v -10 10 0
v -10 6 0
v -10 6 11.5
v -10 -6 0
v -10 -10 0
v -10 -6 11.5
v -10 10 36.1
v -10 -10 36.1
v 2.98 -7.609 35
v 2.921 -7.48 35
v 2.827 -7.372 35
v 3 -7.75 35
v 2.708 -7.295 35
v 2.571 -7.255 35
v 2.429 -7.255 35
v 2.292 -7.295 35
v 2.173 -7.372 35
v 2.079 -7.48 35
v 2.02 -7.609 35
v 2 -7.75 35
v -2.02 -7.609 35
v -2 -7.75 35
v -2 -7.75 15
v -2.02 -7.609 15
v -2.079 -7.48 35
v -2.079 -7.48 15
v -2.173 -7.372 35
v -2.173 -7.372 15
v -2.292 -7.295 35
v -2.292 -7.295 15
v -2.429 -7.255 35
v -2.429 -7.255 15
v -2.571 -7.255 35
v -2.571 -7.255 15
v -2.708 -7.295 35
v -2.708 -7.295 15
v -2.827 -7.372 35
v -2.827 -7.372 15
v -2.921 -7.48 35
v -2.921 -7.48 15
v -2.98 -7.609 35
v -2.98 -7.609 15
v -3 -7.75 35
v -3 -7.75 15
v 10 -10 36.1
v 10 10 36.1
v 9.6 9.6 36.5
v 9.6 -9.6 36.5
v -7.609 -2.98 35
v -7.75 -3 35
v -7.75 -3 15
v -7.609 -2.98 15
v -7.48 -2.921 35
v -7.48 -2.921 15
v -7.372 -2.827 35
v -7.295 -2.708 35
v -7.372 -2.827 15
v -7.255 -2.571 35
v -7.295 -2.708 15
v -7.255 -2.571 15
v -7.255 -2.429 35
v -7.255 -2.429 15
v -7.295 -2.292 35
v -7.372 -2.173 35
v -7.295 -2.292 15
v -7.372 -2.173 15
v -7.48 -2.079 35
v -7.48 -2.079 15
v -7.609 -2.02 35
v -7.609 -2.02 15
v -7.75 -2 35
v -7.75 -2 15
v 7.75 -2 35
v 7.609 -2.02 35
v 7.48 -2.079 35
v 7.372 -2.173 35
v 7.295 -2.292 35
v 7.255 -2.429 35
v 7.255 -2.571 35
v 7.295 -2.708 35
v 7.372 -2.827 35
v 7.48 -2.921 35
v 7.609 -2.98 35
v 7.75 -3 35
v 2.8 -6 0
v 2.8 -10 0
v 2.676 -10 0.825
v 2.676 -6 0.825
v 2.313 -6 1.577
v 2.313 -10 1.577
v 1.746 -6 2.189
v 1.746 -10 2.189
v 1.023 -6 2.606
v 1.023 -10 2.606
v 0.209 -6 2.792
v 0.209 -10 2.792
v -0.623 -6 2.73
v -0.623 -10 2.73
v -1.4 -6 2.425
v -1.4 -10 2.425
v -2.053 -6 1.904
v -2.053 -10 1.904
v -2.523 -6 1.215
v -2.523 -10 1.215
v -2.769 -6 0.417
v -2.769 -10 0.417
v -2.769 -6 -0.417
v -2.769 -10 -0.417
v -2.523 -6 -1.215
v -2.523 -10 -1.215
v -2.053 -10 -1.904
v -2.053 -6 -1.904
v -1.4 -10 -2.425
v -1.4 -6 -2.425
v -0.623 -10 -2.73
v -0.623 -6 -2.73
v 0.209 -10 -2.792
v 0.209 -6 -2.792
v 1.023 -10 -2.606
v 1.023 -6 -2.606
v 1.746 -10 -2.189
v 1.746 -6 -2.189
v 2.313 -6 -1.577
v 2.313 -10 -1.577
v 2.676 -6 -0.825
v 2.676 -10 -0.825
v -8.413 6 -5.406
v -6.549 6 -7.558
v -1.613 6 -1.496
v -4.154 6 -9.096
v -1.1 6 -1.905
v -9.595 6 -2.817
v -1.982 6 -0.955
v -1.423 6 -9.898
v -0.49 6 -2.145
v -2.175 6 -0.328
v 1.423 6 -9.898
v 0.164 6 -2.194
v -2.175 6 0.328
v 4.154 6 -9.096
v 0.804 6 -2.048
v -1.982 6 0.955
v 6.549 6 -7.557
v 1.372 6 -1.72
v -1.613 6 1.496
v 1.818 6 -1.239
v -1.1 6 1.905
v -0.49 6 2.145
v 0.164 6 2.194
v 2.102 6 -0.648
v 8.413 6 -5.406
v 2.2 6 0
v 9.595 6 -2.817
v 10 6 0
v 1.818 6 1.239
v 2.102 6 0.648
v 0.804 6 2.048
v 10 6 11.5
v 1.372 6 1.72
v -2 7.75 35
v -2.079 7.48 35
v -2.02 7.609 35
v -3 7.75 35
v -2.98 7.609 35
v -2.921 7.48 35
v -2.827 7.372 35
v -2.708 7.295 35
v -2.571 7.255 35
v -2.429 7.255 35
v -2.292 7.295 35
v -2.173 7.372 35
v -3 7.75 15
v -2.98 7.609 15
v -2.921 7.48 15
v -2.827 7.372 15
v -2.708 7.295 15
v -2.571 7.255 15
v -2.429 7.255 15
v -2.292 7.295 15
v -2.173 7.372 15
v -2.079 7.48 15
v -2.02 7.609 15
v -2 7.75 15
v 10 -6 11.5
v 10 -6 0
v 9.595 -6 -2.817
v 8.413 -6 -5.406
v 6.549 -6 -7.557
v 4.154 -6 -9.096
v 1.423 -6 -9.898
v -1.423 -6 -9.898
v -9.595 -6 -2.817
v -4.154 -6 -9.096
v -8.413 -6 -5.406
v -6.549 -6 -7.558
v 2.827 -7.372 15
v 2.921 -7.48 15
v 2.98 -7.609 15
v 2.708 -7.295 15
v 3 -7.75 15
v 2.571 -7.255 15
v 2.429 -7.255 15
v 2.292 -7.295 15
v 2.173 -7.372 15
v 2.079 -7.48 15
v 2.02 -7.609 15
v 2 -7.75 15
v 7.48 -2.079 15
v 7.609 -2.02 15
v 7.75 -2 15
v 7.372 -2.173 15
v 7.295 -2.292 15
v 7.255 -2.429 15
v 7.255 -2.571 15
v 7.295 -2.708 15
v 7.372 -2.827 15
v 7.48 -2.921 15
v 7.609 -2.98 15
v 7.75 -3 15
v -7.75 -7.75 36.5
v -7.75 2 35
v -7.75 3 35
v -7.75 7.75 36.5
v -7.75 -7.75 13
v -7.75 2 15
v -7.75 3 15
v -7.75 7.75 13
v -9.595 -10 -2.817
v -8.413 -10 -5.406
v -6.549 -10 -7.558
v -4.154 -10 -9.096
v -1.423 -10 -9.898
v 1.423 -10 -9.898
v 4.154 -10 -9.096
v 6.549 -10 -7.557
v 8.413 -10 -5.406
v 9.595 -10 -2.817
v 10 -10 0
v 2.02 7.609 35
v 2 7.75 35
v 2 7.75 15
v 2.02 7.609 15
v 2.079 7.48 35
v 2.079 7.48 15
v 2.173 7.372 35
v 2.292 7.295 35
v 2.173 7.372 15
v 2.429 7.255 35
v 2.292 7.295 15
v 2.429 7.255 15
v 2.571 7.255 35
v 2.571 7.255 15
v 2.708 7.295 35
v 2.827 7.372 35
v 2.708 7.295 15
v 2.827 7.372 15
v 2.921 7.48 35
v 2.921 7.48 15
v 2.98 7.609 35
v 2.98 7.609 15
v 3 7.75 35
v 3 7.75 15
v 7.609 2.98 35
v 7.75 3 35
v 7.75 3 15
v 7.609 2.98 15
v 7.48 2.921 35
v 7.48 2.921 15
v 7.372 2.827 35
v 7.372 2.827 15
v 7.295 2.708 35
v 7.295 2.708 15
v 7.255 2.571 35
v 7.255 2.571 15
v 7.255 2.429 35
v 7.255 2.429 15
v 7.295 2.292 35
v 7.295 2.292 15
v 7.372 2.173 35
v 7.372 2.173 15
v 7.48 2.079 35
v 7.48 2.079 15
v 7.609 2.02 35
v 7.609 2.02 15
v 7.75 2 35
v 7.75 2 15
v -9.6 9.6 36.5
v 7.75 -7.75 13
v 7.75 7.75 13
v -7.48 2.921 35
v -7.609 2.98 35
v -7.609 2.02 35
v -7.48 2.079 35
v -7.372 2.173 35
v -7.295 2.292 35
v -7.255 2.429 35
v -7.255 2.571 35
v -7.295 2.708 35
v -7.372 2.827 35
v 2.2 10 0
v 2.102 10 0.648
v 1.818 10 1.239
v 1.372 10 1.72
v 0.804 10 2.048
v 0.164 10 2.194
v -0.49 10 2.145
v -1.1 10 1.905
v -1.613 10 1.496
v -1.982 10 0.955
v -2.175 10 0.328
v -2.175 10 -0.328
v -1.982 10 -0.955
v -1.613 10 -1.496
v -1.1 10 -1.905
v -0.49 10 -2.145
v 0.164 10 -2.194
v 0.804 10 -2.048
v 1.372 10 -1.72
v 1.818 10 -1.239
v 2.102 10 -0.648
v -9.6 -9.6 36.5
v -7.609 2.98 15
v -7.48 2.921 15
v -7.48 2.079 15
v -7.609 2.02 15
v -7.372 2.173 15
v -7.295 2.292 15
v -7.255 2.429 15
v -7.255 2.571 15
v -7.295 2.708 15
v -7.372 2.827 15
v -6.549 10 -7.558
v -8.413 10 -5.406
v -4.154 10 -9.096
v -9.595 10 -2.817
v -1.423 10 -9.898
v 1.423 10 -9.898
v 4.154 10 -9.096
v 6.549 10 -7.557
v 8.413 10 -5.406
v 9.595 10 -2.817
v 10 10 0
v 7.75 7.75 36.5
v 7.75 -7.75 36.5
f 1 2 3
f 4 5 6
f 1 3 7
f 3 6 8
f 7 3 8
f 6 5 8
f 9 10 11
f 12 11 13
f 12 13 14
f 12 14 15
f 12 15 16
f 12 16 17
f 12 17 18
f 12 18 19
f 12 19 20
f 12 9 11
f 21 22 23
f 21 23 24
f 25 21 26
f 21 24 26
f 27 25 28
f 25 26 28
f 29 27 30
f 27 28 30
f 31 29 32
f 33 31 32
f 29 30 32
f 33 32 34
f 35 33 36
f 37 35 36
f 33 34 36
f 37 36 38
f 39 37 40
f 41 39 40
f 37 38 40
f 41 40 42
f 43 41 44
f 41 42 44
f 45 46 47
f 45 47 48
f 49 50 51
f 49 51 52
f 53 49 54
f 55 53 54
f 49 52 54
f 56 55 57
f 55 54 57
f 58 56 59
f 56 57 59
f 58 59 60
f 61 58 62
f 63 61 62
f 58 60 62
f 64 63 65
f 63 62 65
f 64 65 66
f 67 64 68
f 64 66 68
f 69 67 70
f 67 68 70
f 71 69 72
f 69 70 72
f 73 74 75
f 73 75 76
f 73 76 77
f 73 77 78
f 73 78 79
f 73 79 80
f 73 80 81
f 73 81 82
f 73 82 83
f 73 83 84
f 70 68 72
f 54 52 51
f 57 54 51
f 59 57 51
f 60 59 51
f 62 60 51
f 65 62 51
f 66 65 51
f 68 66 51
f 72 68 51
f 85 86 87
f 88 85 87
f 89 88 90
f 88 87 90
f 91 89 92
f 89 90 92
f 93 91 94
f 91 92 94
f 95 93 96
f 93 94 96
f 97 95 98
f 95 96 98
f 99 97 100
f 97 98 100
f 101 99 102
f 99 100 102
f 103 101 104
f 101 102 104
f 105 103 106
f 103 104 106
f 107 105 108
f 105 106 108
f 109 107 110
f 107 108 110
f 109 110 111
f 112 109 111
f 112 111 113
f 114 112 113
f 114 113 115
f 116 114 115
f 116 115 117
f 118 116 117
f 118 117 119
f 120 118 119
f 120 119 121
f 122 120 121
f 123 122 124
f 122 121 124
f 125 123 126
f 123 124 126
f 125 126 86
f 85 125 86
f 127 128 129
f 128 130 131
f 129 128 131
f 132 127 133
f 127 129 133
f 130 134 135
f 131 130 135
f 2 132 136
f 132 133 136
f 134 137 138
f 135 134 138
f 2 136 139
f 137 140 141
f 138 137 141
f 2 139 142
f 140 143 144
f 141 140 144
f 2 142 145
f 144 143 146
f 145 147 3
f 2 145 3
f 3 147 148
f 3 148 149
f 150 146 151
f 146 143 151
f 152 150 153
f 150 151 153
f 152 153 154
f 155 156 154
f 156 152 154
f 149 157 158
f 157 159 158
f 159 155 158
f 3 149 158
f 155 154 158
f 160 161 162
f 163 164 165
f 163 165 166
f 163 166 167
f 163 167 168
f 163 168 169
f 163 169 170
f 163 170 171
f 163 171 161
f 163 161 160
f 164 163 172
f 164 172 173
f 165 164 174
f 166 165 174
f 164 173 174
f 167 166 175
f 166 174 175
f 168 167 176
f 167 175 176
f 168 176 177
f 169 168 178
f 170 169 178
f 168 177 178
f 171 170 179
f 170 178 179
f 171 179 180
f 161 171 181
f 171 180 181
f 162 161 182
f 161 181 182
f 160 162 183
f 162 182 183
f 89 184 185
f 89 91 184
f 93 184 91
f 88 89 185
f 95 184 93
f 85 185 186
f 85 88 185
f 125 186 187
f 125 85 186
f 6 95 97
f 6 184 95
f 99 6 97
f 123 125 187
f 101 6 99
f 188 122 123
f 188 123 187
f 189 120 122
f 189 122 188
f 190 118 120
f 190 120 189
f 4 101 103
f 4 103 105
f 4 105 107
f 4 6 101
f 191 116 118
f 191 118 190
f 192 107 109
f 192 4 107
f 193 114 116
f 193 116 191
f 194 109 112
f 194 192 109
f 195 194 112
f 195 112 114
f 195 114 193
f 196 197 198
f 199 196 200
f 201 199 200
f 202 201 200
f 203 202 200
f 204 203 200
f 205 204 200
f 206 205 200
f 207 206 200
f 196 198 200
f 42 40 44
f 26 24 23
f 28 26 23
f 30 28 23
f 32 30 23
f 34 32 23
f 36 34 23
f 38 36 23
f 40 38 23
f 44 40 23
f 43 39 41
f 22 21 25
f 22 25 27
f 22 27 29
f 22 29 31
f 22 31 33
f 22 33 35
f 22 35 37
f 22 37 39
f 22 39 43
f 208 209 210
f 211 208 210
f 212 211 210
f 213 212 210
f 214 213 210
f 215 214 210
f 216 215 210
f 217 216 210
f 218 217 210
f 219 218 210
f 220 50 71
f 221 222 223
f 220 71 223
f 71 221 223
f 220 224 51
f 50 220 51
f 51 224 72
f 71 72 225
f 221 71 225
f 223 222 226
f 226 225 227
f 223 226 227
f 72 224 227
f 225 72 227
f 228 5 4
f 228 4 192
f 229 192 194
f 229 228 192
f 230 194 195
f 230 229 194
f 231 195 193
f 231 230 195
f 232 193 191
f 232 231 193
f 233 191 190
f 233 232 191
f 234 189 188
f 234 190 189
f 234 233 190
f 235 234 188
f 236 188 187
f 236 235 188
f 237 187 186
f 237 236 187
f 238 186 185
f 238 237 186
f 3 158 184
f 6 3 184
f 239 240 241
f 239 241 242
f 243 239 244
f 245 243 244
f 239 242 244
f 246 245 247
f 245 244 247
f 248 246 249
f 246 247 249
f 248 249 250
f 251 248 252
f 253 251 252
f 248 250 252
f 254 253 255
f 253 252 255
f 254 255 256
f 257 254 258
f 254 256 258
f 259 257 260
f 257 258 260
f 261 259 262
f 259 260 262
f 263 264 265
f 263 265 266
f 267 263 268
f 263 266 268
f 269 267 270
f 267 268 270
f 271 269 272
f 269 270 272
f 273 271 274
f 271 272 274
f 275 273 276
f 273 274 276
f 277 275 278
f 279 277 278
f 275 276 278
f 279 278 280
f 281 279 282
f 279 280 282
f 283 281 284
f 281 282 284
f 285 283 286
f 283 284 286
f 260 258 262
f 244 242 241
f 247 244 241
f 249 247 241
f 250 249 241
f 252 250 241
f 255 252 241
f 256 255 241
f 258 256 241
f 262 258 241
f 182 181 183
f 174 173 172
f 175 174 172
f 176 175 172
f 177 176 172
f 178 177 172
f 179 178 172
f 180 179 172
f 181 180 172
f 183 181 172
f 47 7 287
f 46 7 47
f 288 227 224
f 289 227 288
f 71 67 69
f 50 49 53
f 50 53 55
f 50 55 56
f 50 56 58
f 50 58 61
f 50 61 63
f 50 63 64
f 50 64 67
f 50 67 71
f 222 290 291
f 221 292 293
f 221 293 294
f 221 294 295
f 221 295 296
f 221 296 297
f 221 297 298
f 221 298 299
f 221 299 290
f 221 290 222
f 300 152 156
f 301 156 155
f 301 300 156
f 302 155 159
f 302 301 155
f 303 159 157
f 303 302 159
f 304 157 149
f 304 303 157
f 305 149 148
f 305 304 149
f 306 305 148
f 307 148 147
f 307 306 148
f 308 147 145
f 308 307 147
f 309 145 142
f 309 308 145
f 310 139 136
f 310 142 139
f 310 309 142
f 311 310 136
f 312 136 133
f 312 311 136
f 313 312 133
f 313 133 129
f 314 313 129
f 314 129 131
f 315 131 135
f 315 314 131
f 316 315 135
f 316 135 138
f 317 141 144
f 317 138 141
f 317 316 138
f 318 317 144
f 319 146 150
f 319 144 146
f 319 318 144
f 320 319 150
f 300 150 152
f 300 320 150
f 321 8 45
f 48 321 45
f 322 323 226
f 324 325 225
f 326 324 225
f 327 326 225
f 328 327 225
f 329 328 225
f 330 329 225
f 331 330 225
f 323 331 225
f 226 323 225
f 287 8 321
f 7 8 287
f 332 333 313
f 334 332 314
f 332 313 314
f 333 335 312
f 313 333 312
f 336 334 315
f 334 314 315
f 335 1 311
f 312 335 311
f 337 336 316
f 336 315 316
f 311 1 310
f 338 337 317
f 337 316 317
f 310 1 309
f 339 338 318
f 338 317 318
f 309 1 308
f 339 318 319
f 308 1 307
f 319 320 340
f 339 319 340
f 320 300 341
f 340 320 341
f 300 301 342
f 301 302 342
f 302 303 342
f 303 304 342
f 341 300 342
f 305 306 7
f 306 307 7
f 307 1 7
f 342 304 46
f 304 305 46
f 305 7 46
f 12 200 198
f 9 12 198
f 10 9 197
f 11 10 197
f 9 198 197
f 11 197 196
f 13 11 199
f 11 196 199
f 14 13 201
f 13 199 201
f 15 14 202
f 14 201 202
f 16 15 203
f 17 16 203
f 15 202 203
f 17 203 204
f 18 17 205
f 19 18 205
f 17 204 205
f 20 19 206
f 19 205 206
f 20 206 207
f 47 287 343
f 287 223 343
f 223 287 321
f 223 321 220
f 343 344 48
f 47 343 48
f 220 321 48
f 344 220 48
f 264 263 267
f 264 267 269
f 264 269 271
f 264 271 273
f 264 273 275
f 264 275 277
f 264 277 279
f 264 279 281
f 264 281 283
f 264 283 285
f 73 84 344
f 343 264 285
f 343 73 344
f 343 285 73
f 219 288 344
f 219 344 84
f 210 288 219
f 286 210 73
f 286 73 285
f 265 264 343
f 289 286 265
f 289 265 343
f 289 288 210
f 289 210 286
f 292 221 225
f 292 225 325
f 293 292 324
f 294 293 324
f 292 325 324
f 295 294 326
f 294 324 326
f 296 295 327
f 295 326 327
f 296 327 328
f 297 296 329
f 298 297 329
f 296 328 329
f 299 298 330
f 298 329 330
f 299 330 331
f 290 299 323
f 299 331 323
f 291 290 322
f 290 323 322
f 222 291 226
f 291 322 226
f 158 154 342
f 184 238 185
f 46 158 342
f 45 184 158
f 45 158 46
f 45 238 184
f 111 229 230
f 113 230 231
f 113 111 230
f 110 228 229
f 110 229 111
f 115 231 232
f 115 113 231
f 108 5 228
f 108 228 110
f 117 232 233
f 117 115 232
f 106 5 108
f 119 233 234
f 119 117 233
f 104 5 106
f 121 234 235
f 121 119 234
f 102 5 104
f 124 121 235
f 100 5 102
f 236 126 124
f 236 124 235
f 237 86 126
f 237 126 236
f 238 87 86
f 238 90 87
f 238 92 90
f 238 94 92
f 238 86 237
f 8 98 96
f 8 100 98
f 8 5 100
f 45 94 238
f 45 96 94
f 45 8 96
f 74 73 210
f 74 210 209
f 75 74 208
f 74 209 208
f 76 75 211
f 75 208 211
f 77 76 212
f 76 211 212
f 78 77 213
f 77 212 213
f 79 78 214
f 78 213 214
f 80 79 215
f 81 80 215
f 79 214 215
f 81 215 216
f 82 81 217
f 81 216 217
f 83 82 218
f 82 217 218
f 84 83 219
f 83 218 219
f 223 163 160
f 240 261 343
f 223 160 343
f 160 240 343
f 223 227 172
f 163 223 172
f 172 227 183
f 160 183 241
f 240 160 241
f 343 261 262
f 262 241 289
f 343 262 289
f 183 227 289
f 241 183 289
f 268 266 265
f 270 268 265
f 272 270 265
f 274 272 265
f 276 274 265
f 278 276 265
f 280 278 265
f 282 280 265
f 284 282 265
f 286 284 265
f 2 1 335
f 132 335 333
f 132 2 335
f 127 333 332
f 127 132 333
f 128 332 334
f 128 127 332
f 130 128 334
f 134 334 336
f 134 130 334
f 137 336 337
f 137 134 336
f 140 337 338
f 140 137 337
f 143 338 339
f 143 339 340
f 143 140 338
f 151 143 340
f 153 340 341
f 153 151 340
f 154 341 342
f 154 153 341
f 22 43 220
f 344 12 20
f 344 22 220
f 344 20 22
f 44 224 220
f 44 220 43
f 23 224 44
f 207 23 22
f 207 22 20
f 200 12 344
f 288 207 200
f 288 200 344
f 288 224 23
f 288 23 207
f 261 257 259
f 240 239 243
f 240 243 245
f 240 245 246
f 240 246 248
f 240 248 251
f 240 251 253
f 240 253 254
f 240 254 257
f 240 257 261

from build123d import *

# Parameters (mm, degrees)
SKETCH264_R           = 2.2
PAD066_DEPTH          = 10
POCKET176_DEPTH       = 10.001
POCKET176_DEPTH_BACK  = 10.001
SKETCH265_W           = 15.5
SKETCH265_H           = 15.5
POCKET177_DEPTH       = 23.501
CYLINDER014_R         = 0.5
CYLINDER014_DEPTH     = 20
CYLINDER015_R         = 0.5
CYLINDER015_DEPTH     = 20
POLARPATTERN005_COUNT = 4
SKETCH271_R           = 2.8
POCKET189_DEPTH       = 4
CHAMFER_SIZE          = 0.4


with BuildPart() as part:
    # Sketch264 → Pad066 (new body, symmetric)
    with BuildSketch(Plane.XZ):
        with BuildLine():
            ThreePointArc((-10, -4.2e-05), (2.1e-05, -10), (10, 0))
            Line((10, 0), (10, 11.5))
            Line((10, 12), (10, 11.5))
            Line((10, 36.5), (10, 12))
            Line((-10, 36.5), (10, 36.5))
            Line((-10, 12), (-10, 36.5))
            Line((-10, 11.5), (-10, 12))
            Line((-10, -4.2e-05), (-10, 11.5))
        make_face()
        Circle(SKETCH264_R, mode=Mode.SUBTRACT)
    extrude(amount=PAD066_DEPTH, both=True)

    # Sketch263 → Pocket176 (cut, two sides)
    with BuildSketch(Plane.YZ) as pocket176_sk:
        Polygon((-6, 11.5), (-6, -11), (-10, -11), (-10, 11.5), (-11.5, 13), (-11.5, -13), (11.5, -13), (11.5, 13), (10, 11.5), (10, -11), (6, -11), (6, 11.5), align=None)
    extrude(amount=-POCKET176_DEPTH, mode=Mode.SUBTRACT)
    extrude(pocket176_sk.sketch, amount=POCKET176_DEPTH_BACK, mode=Mode.SUBTRACT)

    # Sketch265 → Pocket177 (cut, through all)
    with BuildSketch(Plane.XY.offset(13)):
        Rectangle(SKETCH265_W, SKETCH265_H)
    extrude(amount=POCKET177_DEPTH, mode=Mode.SUBTRACT)

    # Cylinder014 → Cylinder014 (join)
    with BuildSketch(Plane(origin=(7.75, -2.5, 15), x_dir=(1, 0, 0), z_dir=(0, 0, 1))):
        Circle(CYLINDER014_R)
    cylinder014 = extrude(amount=CYLINDER014_DEPTH)

    # Cylinder015 → Cylinder015 (join)
    with BuildSketch(Plane(origin=(7.75, 2.5, 15), x_dir=(1, 0, 0), z_dir=(0, 0, 1))):
        Circle(CYLINDER015_R)
    cylinder015 = extrude(amount=CYLINDER015_DEPTH)

    # PolarPattern005: Cylinder014, Cylinder015 ×4 about axis
    polarpattern005_axis = Axis((0, 0, 0), (0, 0, 1))
    for i in range(1, POLARPATTERN005_COUNT):
        add(cylinder014.rotate(polarpattern005_axis, i * 360 / POLARPATTERN005_COUNT))
        add(cylinder015.rotate(polarpattern005_axis, i * 360 / POLARPATTERN005_COUNT))

    # Sketch271 → Pocket189 (cut)
    with BuildSketch(Plane.XZ.offset(10)):
        Circle(SKETCH271_R)
    extrude(amount=-POCKET189_DEPTH, mode=Mode.SUBTRACT)

    # Chamfer
    chamfer_edges = [part.edges().sort_by_distance(p)[0] for p in [
        (10, 0, 36.5),
        (0, -10, 36.5),
        (-10, 0, 36.5),
        (0, 10, 36.5),
    ]]
    chamfer(chamfer_edges, length=CHAMFER_SIZE)


solid = part.part
